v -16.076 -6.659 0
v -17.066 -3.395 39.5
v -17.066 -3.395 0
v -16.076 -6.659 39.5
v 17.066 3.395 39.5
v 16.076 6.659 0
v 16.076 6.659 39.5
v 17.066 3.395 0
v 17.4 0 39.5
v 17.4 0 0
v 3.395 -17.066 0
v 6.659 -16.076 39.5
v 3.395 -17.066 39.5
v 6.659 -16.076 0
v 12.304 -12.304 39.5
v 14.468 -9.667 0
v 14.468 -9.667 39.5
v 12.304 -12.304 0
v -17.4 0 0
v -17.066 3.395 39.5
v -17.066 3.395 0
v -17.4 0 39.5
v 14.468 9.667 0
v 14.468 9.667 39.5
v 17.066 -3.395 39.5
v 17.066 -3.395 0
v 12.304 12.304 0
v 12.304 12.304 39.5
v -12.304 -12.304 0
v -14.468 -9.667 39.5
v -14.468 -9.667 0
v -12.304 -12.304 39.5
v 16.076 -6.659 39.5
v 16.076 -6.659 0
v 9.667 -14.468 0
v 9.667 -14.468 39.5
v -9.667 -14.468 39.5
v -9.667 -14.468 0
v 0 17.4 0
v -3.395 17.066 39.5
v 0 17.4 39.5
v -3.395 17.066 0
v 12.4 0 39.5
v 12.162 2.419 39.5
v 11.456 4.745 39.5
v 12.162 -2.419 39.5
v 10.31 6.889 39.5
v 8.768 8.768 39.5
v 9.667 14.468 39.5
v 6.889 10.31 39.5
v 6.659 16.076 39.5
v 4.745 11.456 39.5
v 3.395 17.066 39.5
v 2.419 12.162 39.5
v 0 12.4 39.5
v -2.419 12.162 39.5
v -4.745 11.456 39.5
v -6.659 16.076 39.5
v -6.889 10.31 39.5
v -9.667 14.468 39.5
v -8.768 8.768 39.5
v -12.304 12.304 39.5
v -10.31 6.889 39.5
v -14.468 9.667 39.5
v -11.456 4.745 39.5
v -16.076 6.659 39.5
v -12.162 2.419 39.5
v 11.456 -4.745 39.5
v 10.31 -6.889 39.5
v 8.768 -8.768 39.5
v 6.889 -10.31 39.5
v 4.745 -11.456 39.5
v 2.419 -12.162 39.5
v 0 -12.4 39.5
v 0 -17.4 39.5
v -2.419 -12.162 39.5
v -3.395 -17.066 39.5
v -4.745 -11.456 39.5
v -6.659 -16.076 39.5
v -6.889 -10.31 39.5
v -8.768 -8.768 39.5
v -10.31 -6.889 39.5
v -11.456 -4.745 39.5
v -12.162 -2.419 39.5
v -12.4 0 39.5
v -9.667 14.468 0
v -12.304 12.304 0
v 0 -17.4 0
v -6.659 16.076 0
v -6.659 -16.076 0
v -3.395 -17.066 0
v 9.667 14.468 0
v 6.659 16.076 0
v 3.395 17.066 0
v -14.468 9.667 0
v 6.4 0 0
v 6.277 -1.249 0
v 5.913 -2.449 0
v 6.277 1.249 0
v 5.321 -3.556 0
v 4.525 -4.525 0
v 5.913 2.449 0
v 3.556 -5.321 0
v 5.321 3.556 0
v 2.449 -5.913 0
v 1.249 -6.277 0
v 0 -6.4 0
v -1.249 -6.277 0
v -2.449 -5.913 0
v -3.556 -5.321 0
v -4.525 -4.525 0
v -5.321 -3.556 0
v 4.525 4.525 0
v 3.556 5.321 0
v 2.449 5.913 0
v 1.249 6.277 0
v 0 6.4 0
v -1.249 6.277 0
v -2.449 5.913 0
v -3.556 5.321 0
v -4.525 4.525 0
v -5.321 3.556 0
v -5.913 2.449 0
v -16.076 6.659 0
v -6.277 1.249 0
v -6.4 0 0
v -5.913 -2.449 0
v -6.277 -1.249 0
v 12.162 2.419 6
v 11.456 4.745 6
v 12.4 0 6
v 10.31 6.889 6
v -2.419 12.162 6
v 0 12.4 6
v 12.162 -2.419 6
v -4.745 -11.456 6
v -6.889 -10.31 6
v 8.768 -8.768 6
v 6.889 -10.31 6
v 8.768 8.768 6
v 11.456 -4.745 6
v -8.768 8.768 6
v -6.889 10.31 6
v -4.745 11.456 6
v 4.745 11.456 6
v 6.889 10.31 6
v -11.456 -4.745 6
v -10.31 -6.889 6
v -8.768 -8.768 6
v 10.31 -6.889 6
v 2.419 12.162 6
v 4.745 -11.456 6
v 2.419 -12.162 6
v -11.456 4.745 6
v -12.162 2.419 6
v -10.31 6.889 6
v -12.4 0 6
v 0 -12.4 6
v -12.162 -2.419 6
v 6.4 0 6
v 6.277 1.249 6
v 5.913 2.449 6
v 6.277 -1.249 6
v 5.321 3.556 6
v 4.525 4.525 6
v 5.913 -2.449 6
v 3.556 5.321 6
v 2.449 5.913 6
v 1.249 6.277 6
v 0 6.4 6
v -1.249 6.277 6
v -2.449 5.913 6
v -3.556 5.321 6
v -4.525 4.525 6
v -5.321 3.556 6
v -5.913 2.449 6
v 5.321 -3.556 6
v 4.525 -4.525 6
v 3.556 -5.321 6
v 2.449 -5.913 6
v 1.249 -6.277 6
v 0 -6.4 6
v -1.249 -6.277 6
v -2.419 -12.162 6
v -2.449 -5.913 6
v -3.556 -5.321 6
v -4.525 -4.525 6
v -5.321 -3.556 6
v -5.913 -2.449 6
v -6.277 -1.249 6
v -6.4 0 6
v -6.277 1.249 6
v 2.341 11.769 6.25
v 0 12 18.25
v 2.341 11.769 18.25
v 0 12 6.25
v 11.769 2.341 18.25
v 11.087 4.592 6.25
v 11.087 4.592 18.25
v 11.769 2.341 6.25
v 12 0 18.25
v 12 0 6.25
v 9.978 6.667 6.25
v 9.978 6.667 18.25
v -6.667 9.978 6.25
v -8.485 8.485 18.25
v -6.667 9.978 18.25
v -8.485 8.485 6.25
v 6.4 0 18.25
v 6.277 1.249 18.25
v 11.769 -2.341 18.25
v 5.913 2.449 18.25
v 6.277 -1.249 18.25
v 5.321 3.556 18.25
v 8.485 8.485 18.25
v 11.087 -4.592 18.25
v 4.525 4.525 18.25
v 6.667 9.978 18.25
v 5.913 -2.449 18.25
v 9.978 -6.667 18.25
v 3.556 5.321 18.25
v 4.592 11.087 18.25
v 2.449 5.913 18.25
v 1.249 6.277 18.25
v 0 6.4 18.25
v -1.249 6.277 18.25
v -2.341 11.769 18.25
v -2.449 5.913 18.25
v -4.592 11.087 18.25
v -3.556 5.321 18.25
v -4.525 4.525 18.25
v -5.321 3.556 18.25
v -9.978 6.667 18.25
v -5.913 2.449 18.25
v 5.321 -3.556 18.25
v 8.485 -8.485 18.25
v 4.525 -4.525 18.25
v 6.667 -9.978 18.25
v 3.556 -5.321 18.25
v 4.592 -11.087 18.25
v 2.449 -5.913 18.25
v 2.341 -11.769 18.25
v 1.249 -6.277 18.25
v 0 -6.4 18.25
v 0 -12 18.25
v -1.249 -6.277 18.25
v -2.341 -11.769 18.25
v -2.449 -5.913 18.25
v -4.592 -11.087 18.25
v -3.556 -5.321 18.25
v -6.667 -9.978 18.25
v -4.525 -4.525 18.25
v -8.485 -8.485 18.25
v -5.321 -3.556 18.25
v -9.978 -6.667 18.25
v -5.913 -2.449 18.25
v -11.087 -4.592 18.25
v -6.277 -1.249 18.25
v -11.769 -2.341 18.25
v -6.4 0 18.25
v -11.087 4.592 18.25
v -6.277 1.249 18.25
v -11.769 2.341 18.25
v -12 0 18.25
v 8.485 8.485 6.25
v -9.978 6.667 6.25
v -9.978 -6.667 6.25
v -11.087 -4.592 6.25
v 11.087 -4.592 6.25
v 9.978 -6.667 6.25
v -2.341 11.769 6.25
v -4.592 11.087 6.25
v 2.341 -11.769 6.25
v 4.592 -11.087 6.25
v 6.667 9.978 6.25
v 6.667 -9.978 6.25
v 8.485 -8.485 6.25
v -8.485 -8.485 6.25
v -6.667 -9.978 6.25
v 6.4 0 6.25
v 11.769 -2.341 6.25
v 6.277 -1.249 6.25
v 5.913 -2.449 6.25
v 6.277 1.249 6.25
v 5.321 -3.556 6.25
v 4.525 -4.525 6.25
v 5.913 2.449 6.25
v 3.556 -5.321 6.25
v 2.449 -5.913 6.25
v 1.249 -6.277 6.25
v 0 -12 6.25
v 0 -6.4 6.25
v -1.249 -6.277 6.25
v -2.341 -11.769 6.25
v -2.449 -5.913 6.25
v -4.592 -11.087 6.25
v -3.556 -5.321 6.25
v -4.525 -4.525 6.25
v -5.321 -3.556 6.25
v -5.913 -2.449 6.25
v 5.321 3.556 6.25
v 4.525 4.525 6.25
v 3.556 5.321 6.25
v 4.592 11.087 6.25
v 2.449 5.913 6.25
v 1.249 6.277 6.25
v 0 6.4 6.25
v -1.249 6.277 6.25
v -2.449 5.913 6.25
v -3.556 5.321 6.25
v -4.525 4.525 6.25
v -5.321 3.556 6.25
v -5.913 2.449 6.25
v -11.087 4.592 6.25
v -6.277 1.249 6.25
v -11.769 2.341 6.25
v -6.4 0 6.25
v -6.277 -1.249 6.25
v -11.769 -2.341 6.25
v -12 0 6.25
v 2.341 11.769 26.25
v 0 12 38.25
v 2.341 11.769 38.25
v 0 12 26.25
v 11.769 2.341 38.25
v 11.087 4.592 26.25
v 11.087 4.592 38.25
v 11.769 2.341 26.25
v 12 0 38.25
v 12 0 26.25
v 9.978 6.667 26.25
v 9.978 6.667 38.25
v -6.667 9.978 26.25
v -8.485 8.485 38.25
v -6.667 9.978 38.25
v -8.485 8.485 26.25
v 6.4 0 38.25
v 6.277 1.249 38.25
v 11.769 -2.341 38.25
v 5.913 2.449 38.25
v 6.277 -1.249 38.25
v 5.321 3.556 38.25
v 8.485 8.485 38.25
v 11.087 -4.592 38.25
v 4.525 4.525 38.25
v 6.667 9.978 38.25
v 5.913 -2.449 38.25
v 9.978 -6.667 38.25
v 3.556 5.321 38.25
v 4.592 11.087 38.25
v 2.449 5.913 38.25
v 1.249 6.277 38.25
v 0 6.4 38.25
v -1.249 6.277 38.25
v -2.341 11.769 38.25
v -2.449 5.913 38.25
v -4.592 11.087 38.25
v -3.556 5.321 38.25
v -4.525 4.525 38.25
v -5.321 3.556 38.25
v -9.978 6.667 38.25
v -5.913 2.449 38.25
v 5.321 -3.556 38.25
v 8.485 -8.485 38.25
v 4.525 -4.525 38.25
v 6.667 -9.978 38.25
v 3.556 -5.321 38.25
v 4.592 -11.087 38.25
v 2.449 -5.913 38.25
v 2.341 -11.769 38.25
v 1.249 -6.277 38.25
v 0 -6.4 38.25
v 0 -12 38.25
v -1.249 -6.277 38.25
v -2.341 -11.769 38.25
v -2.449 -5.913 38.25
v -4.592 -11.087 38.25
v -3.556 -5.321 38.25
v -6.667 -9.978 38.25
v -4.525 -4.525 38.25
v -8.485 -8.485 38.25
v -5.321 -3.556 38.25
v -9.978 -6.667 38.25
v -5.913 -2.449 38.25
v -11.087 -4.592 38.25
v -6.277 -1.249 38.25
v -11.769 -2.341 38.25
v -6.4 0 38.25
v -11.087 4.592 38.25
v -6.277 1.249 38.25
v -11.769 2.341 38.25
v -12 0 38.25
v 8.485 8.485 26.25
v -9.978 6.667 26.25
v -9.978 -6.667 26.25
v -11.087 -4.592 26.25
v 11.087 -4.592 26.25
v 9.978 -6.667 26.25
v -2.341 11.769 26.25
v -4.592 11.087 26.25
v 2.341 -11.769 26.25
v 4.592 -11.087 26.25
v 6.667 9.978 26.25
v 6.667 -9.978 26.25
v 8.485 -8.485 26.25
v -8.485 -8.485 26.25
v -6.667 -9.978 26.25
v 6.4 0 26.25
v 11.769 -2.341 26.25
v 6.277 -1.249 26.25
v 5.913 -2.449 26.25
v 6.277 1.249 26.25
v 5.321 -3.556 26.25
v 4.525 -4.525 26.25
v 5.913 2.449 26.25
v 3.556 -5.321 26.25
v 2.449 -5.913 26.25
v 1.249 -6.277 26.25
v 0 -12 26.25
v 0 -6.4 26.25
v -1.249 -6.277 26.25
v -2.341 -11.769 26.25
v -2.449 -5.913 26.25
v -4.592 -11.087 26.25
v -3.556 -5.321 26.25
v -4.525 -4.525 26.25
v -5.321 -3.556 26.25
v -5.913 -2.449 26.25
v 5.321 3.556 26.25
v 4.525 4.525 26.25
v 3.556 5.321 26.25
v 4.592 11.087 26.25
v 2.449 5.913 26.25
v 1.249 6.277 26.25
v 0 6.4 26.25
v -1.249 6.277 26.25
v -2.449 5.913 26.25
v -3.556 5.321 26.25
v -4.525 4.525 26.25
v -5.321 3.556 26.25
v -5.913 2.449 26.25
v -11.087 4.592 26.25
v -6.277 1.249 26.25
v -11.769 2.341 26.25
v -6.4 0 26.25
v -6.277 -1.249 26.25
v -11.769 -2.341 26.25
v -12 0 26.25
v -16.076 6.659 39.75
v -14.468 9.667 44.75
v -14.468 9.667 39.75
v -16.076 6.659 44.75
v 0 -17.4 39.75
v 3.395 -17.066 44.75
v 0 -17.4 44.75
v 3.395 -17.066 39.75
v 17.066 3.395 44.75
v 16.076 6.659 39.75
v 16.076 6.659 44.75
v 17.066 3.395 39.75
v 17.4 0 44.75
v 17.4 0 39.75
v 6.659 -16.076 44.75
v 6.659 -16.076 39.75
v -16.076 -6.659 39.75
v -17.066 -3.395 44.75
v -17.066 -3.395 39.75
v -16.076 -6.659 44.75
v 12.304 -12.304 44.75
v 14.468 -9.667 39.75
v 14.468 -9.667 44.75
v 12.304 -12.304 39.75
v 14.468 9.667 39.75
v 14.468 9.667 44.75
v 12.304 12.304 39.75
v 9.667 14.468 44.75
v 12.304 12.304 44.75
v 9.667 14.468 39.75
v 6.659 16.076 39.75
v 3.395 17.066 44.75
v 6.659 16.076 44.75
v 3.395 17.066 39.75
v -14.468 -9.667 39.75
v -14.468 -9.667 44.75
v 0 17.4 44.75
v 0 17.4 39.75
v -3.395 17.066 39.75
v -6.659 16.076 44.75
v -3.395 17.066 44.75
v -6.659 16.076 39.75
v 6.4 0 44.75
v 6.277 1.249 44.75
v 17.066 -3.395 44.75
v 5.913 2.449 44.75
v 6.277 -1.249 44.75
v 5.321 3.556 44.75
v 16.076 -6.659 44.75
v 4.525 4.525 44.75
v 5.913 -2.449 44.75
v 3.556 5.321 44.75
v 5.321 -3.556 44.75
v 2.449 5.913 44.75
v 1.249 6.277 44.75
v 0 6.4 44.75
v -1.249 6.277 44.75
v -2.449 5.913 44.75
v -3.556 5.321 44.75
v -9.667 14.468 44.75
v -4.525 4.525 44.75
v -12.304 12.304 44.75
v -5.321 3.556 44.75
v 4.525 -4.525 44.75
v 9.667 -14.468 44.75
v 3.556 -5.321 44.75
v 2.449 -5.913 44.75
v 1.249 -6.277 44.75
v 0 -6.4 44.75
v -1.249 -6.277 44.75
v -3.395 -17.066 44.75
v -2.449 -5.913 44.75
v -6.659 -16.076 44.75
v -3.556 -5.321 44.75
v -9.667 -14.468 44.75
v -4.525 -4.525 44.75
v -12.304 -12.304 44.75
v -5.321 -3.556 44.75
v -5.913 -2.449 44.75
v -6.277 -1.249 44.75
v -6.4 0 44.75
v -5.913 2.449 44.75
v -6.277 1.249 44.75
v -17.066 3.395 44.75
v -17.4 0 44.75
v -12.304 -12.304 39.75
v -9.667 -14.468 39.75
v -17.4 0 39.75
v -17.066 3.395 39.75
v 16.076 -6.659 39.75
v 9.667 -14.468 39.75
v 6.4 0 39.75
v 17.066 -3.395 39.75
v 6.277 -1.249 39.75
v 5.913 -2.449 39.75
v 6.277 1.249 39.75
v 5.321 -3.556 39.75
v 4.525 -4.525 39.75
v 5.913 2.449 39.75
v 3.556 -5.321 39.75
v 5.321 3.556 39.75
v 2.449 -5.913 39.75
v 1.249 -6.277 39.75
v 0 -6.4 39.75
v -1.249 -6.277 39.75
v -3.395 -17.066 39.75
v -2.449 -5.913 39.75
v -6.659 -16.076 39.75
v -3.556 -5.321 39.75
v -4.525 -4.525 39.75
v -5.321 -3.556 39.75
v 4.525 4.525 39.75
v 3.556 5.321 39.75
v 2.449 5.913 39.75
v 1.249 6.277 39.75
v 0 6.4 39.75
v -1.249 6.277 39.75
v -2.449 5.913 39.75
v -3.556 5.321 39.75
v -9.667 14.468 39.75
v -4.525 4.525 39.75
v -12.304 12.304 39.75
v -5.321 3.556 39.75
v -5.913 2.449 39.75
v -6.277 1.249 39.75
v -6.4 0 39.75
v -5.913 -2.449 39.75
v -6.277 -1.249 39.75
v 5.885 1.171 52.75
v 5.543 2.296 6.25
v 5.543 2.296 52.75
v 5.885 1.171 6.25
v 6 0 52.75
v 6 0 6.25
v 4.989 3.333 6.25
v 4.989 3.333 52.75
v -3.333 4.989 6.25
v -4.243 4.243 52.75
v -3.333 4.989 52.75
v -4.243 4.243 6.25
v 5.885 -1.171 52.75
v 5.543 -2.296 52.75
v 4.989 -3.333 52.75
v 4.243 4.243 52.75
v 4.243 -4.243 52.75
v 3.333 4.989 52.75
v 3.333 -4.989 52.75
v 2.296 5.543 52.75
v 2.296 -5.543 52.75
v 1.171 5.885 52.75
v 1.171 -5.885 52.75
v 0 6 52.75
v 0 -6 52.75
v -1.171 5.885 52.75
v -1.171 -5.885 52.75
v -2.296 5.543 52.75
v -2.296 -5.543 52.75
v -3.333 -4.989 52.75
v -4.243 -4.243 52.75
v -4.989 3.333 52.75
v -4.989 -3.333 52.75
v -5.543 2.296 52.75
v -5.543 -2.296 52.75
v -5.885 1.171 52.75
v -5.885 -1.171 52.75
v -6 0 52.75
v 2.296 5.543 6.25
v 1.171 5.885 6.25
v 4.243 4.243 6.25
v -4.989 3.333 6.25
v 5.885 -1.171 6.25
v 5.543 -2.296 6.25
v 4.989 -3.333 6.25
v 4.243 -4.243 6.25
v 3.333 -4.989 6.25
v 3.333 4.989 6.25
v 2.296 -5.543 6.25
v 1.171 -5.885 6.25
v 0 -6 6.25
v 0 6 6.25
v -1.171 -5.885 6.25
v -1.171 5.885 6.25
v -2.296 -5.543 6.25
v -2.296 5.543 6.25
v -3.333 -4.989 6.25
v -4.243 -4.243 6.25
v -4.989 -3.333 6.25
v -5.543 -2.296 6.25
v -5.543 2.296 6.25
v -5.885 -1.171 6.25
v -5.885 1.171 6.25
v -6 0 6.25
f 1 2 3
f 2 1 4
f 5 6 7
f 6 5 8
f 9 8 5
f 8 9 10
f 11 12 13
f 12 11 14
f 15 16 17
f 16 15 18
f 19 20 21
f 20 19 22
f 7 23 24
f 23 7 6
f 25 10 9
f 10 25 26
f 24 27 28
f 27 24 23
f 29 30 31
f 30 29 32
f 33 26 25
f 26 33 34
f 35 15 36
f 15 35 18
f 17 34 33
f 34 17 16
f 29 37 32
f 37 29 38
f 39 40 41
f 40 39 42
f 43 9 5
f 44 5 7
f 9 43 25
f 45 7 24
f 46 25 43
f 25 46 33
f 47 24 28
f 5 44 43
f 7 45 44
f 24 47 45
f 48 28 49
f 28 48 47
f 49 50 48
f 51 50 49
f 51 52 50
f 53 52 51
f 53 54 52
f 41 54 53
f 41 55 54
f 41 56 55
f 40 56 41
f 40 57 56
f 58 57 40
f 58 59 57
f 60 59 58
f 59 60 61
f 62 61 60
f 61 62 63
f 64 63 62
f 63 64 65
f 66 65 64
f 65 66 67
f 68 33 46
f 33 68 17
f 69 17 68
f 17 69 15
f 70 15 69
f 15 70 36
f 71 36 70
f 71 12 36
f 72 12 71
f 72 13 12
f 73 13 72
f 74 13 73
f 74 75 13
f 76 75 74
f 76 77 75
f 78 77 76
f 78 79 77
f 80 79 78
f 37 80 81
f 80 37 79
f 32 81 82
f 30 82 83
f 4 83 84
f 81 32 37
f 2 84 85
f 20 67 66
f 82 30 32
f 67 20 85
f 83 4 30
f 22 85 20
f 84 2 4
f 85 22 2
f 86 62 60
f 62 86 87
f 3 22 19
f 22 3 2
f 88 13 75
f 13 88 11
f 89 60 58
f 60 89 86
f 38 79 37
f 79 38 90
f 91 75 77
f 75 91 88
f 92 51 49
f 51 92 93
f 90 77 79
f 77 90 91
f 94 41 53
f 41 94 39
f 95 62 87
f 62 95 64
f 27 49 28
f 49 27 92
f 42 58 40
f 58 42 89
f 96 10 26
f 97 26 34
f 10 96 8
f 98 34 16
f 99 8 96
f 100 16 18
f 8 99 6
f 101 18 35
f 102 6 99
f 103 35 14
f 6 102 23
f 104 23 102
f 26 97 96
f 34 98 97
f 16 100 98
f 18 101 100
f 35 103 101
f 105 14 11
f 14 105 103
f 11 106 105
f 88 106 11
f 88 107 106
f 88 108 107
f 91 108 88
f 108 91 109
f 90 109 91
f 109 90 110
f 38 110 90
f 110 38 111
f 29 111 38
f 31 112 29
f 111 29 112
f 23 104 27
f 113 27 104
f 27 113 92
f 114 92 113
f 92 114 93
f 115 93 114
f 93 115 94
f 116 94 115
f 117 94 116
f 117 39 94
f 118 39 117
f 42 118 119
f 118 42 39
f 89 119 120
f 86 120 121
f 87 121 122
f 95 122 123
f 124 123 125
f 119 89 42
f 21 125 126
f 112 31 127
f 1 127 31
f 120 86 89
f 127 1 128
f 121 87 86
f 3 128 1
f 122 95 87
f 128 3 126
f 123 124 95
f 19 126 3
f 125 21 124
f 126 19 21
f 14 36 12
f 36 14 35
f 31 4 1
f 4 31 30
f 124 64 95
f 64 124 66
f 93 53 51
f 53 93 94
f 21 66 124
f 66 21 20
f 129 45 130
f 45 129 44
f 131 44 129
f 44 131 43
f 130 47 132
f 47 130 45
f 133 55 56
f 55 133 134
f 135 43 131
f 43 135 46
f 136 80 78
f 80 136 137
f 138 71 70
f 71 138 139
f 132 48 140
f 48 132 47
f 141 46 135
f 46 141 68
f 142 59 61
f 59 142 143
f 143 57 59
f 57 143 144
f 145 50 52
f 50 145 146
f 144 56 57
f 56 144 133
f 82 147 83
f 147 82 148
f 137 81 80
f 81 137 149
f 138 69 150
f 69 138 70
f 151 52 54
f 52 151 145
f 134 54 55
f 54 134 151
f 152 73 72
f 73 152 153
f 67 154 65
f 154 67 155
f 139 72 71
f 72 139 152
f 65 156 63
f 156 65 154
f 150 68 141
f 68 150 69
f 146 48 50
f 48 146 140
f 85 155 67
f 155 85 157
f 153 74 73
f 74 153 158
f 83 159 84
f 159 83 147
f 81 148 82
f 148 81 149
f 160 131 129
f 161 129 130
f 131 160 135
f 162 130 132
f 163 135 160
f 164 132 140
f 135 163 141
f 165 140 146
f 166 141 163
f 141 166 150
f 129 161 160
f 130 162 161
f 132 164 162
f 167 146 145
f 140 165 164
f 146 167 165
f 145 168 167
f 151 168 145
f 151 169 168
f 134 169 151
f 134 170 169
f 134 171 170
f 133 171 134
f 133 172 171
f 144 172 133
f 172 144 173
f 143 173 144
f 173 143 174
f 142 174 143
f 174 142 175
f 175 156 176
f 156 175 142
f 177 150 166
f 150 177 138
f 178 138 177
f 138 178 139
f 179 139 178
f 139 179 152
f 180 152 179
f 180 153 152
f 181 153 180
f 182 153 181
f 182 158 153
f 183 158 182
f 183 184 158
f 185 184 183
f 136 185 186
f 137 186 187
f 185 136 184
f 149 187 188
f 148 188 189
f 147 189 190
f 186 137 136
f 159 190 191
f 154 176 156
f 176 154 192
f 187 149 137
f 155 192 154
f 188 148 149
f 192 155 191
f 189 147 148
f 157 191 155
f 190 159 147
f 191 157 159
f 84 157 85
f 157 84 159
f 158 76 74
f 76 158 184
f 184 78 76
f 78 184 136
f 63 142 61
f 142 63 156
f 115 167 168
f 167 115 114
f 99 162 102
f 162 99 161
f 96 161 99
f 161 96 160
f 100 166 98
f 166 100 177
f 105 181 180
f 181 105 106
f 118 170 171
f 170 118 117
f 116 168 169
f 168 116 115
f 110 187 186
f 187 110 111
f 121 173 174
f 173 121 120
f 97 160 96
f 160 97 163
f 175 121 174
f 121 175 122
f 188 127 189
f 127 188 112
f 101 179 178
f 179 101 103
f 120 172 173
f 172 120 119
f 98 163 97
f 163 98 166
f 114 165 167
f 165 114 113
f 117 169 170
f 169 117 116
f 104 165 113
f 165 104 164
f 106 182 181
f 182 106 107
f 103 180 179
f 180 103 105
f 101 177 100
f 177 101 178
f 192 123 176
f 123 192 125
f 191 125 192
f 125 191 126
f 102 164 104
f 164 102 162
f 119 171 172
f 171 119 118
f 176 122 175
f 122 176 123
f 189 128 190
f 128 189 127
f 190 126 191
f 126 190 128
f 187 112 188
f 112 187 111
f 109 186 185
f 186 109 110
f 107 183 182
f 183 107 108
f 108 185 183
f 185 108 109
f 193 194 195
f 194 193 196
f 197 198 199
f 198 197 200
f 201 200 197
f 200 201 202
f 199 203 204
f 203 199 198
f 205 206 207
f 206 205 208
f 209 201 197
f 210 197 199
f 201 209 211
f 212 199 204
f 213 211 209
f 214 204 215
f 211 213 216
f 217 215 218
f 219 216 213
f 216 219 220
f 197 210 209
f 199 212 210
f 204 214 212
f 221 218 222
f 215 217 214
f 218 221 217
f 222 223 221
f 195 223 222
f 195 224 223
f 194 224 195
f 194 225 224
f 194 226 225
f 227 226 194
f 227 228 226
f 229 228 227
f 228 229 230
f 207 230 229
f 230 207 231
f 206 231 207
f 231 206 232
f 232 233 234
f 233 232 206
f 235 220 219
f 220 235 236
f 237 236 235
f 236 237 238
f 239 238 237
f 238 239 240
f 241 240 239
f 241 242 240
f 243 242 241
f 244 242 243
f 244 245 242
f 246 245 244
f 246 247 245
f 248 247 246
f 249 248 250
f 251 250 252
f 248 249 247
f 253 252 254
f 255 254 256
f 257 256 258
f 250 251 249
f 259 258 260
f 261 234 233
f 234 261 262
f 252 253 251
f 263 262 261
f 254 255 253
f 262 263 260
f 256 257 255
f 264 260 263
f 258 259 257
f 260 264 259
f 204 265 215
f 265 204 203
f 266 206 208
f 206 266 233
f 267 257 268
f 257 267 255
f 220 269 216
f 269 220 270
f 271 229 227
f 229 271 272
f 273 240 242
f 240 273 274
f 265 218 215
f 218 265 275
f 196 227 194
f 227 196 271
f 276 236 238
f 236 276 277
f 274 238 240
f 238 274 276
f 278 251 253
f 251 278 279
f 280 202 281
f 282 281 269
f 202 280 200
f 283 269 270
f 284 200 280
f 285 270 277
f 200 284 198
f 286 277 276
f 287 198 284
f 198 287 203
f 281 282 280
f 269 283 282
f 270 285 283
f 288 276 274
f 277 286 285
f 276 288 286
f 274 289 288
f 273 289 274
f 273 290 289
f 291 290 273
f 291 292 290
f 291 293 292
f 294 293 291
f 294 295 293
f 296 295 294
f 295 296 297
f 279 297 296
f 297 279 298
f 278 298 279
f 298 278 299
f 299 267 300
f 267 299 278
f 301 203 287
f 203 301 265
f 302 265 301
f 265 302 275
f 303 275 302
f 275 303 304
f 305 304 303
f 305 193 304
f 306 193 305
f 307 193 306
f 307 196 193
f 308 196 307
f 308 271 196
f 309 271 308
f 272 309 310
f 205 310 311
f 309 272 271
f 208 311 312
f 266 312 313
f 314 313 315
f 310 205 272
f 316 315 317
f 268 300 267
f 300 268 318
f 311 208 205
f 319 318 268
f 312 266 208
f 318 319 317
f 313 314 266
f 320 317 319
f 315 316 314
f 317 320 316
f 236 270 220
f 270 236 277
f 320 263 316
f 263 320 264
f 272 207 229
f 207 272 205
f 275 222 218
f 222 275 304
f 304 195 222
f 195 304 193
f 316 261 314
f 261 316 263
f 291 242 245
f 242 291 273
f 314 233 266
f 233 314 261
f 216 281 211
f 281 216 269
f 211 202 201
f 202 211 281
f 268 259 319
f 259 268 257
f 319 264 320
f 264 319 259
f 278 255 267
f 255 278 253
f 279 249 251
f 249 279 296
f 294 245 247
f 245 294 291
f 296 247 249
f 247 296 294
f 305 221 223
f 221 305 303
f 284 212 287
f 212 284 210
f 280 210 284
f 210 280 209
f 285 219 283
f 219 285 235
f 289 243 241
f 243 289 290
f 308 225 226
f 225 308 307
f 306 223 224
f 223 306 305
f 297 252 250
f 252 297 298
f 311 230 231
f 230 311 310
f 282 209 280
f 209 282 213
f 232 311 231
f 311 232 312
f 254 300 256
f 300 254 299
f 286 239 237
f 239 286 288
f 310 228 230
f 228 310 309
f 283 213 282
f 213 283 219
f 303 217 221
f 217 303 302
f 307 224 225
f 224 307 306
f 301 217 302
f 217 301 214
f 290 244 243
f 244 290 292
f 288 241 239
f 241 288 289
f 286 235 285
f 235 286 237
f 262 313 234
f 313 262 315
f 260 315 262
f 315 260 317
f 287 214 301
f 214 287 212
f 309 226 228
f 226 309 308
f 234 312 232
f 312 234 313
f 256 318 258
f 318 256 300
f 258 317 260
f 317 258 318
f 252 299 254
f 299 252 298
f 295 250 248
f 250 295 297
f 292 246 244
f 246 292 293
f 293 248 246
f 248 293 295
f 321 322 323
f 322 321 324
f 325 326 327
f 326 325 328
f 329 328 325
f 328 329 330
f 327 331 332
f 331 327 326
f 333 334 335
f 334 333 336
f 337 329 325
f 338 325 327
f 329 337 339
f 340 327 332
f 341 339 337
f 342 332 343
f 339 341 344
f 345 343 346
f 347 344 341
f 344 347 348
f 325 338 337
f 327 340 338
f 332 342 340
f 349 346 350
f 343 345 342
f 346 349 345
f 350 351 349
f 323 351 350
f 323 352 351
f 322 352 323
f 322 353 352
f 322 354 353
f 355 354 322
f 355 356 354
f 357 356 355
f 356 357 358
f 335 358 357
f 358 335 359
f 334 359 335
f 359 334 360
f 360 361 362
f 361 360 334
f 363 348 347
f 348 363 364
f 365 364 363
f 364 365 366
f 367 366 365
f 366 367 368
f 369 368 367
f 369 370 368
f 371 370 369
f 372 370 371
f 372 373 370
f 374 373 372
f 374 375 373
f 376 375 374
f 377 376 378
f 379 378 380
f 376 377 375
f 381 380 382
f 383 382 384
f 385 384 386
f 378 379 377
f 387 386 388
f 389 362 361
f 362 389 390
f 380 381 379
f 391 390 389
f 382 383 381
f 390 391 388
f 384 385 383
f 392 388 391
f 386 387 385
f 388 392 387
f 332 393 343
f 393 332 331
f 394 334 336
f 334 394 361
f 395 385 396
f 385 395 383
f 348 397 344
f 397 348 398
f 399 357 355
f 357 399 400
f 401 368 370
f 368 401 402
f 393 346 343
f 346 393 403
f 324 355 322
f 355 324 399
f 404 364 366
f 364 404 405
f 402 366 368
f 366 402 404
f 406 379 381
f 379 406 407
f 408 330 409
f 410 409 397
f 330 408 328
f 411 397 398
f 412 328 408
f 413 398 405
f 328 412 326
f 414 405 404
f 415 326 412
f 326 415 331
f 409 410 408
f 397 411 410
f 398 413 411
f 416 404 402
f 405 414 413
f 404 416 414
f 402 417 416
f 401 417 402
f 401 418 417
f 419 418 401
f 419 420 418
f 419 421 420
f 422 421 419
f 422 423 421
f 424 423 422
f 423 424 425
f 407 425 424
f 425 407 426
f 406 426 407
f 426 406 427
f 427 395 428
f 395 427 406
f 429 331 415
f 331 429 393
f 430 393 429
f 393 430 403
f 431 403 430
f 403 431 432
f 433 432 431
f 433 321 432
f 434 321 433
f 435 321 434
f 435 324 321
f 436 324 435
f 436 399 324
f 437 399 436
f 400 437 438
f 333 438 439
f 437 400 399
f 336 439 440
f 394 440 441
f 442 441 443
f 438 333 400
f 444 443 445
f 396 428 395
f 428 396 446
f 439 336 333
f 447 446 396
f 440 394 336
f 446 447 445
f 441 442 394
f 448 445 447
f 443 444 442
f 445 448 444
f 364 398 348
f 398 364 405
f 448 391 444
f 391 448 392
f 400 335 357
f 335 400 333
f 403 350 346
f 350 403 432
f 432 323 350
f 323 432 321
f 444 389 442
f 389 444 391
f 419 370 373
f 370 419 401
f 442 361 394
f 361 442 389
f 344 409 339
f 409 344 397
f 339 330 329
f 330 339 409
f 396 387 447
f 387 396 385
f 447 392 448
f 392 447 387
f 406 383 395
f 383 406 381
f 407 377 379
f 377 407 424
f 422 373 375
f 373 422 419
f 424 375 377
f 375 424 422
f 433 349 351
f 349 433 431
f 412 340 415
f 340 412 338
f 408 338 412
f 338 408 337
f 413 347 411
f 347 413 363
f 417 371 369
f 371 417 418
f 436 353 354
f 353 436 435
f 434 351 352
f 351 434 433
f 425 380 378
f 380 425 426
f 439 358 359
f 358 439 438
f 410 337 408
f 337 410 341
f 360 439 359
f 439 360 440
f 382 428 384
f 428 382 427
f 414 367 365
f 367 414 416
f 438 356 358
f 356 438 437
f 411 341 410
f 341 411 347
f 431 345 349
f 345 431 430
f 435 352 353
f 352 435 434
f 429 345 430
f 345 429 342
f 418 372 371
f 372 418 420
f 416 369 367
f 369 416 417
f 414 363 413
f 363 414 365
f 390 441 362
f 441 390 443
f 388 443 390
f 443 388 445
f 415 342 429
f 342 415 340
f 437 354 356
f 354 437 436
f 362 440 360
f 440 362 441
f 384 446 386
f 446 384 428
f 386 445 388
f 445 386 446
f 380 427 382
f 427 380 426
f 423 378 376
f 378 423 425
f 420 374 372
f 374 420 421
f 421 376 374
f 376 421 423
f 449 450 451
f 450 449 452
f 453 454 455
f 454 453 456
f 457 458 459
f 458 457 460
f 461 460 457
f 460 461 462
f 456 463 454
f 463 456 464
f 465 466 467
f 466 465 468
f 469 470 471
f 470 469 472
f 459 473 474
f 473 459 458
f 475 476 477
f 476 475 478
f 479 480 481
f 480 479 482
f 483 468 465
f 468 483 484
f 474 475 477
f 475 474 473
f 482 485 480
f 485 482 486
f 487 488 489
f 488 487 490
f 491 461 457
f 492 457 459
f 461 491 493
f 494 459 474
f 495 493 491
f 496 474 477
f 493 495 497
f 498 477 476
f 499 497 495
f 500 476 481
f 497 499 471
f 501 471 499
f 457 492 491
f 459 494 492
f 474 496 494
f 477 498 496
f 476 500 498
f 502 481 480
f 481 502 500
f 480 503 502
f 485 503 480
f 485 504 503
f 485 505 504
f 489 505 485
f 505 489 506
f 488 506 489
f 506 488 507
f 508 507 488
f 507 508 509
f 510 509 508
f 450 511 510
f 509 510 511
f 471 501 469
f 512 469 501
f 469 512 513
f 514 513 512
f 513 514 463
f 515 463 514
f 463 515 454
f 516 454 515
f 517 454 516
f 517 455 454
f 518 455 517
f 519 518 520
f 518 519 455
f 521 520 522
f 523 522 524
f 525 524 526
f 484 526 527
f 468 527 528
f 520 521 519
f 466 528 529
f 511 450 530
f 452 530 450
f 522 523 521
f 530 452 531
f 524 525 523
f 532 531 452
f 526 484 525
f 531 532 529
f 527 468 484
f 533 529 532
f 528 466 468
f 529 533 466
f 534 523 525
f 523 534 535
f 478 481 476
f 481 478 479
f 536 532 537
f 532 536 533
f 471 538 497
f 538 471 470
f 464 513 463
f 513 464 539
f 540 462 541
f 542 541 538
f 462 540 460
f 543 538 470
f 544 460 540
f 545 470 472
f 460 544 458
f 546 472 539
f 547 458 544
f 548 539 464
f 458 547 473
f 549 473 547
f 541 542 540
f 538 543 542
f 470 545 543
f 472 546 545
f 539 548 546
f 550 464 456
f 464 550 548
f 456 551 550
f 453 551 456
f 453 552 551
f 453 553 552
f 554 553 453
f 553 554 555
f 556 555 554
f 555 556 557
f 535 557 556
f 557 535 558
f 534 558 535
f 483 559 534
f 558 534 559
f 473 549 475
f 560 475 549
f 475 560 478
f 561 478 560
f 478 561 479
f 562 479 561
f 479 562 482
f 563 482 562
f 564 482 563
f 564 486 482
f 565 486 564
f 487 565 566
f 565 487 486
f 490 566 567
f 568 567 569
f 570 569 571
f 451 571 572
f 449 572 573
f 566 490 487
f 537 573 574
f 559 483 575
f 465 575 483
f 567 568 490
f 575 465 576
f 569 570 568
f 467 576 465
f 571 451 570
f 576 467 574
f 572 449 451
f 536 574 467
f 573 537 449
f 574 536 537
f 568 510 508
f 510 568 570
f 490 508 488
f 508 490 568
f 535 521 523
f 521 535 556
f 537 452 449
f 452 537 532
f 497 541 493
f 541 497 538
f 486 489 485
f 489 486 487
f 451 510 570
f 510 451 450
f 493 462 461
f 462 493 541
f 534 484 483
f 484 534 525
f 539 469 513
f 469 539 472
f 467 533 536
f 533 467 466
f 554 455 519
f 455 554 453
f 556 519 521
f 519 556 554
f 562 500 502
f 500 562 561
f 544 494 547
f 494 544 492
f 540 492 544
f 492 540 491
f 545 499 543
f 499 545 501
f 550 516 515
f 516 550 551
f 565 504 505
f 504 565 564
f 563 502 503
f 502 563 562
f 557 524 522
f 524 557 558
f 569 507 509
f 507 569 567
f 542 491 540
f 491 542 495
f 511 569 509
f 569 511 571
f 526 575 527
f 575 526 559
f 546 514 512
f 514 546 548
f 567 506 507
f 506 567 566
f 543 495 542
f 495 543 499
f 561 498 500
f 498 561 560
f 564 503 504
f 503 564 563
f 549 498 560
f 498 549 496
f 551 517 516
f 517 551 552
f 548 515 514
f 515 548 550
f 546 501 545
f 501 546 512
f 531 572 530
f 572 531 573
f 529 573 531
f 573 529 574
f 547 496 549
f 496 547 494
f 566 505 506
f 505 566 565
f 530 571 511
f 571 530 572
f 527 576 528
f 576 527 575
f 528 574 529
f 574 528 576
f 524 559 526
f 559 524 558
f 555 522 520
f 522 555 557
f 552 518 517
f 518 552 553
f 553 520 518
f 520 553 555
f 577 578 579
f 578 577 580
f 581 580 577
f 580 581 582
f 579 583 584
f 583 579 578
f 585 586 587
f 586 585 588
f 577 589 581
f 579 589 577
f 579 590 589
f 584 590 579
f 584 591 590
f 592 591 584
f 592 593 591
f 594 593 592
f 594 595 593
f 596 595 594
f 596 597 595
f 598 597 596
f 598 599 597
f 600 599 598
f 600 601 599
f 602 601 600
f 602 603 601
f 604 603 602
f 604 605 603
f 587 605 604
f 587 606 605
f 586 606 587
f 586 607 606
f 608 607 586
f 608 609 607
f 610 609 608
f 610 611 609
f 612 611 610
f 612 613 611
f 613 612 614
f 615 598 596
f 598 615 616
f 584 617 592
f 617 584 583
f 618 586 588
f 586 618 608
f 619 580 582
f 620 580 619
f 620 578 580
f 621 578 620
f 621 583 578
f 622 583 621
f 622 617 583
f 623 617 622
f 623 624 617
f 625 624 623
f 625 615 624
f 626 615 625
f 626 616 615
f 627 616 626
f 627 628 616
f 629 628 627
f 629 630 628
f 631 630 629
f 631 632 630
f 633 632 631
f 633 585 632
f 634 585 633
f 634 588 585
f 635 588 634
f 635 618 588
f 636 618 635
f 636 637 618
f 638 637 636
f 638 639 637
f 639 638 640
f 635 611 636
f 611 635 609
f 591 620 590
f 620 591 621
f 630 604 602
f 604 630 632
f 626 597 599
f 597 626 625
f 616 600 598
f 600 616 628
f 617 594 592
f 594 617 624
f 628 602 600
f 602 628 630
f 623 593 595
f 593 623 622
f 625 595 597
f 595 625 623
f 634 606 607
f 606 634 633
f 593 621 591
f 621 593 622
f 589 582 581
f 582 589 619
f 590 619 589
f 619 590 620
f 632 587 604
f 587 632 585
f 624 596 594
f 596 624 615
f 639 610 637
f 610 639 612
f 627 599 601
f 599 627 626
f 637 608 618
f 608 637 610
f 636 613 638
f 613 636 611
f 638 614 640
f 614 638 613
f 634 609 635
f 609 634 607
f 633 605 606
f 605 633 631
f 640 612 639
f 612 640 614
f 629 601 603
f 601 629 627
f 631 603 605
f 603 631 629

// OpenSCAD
$fn = 32;

// ------------------------------------------------------------------------
// Shaft station: cup d34.8 x 39.5 mm, shaft d12
// Every part is its own module, assembly() places every instance.
// ------------------------------------------------------------------------

// --- part 1 ---
module housing_cup() {
  difference() {
    cylinder(h = 39.5, d = 34.8);
    translate([0, 0, 6]) cylinder(h = 34.5, d = 24.8);
    translate([0, 0, -1]) cylinder(h = 8, d = 12.8);
  }
}

// --- part 2 ---
module bearing_lower() {
  difference() {
      translate([0, 0, 0]) cylinder(h = 12, d = 24);
      translate([0, 0, -1]) cylinder(h = 14, d = 12.8);
    }
}

// --- part 3 ---
module bearing_upper() {
  difference() {
      translate([0, 0, 0]) cylinder(h = 12, d = 24);
      translate([0, 0, -1]) cylinder(h = 14, d = 12.8);
    }
}

// --- part 4 ---
module station_shaft() {
  translate([0, 0, -23.25]) cylinder(h = 46.5, d = 12);
}

// --- part 5 ---
module station_cover() {
  difference() {
    cylinder(h = 5, d = 34.8);
    translate([0, 0, -1]) cylinder(h = 7, d = 12.8);
  }
}

// --- assembly ---
module assembly() {
  color([0.80, 0.24, 0.20]) translate([0, 0, 0]) rotate([0, 0, 0]) housing_cup();
  color([0.20, 0.45, 0.75]) translate([0, 0, 6.25]) rotate([0, 0, 0]) bearing_lower();
  color([0.25, 0.62, 0.32]) translate([0, 0, 26.25]) rotate([0, 0, 0]) bearing_upper();
  color([0.92, 0.70, 0.18]) translate([0, 0, 29.5]) rotate([0, 0, 0]) station_shaft();
  color([0.58, 0.35, 0.70]) translate([0, 0, 39.75]) rotate([0, 0, 0]) station_cover();
}

assembly();
